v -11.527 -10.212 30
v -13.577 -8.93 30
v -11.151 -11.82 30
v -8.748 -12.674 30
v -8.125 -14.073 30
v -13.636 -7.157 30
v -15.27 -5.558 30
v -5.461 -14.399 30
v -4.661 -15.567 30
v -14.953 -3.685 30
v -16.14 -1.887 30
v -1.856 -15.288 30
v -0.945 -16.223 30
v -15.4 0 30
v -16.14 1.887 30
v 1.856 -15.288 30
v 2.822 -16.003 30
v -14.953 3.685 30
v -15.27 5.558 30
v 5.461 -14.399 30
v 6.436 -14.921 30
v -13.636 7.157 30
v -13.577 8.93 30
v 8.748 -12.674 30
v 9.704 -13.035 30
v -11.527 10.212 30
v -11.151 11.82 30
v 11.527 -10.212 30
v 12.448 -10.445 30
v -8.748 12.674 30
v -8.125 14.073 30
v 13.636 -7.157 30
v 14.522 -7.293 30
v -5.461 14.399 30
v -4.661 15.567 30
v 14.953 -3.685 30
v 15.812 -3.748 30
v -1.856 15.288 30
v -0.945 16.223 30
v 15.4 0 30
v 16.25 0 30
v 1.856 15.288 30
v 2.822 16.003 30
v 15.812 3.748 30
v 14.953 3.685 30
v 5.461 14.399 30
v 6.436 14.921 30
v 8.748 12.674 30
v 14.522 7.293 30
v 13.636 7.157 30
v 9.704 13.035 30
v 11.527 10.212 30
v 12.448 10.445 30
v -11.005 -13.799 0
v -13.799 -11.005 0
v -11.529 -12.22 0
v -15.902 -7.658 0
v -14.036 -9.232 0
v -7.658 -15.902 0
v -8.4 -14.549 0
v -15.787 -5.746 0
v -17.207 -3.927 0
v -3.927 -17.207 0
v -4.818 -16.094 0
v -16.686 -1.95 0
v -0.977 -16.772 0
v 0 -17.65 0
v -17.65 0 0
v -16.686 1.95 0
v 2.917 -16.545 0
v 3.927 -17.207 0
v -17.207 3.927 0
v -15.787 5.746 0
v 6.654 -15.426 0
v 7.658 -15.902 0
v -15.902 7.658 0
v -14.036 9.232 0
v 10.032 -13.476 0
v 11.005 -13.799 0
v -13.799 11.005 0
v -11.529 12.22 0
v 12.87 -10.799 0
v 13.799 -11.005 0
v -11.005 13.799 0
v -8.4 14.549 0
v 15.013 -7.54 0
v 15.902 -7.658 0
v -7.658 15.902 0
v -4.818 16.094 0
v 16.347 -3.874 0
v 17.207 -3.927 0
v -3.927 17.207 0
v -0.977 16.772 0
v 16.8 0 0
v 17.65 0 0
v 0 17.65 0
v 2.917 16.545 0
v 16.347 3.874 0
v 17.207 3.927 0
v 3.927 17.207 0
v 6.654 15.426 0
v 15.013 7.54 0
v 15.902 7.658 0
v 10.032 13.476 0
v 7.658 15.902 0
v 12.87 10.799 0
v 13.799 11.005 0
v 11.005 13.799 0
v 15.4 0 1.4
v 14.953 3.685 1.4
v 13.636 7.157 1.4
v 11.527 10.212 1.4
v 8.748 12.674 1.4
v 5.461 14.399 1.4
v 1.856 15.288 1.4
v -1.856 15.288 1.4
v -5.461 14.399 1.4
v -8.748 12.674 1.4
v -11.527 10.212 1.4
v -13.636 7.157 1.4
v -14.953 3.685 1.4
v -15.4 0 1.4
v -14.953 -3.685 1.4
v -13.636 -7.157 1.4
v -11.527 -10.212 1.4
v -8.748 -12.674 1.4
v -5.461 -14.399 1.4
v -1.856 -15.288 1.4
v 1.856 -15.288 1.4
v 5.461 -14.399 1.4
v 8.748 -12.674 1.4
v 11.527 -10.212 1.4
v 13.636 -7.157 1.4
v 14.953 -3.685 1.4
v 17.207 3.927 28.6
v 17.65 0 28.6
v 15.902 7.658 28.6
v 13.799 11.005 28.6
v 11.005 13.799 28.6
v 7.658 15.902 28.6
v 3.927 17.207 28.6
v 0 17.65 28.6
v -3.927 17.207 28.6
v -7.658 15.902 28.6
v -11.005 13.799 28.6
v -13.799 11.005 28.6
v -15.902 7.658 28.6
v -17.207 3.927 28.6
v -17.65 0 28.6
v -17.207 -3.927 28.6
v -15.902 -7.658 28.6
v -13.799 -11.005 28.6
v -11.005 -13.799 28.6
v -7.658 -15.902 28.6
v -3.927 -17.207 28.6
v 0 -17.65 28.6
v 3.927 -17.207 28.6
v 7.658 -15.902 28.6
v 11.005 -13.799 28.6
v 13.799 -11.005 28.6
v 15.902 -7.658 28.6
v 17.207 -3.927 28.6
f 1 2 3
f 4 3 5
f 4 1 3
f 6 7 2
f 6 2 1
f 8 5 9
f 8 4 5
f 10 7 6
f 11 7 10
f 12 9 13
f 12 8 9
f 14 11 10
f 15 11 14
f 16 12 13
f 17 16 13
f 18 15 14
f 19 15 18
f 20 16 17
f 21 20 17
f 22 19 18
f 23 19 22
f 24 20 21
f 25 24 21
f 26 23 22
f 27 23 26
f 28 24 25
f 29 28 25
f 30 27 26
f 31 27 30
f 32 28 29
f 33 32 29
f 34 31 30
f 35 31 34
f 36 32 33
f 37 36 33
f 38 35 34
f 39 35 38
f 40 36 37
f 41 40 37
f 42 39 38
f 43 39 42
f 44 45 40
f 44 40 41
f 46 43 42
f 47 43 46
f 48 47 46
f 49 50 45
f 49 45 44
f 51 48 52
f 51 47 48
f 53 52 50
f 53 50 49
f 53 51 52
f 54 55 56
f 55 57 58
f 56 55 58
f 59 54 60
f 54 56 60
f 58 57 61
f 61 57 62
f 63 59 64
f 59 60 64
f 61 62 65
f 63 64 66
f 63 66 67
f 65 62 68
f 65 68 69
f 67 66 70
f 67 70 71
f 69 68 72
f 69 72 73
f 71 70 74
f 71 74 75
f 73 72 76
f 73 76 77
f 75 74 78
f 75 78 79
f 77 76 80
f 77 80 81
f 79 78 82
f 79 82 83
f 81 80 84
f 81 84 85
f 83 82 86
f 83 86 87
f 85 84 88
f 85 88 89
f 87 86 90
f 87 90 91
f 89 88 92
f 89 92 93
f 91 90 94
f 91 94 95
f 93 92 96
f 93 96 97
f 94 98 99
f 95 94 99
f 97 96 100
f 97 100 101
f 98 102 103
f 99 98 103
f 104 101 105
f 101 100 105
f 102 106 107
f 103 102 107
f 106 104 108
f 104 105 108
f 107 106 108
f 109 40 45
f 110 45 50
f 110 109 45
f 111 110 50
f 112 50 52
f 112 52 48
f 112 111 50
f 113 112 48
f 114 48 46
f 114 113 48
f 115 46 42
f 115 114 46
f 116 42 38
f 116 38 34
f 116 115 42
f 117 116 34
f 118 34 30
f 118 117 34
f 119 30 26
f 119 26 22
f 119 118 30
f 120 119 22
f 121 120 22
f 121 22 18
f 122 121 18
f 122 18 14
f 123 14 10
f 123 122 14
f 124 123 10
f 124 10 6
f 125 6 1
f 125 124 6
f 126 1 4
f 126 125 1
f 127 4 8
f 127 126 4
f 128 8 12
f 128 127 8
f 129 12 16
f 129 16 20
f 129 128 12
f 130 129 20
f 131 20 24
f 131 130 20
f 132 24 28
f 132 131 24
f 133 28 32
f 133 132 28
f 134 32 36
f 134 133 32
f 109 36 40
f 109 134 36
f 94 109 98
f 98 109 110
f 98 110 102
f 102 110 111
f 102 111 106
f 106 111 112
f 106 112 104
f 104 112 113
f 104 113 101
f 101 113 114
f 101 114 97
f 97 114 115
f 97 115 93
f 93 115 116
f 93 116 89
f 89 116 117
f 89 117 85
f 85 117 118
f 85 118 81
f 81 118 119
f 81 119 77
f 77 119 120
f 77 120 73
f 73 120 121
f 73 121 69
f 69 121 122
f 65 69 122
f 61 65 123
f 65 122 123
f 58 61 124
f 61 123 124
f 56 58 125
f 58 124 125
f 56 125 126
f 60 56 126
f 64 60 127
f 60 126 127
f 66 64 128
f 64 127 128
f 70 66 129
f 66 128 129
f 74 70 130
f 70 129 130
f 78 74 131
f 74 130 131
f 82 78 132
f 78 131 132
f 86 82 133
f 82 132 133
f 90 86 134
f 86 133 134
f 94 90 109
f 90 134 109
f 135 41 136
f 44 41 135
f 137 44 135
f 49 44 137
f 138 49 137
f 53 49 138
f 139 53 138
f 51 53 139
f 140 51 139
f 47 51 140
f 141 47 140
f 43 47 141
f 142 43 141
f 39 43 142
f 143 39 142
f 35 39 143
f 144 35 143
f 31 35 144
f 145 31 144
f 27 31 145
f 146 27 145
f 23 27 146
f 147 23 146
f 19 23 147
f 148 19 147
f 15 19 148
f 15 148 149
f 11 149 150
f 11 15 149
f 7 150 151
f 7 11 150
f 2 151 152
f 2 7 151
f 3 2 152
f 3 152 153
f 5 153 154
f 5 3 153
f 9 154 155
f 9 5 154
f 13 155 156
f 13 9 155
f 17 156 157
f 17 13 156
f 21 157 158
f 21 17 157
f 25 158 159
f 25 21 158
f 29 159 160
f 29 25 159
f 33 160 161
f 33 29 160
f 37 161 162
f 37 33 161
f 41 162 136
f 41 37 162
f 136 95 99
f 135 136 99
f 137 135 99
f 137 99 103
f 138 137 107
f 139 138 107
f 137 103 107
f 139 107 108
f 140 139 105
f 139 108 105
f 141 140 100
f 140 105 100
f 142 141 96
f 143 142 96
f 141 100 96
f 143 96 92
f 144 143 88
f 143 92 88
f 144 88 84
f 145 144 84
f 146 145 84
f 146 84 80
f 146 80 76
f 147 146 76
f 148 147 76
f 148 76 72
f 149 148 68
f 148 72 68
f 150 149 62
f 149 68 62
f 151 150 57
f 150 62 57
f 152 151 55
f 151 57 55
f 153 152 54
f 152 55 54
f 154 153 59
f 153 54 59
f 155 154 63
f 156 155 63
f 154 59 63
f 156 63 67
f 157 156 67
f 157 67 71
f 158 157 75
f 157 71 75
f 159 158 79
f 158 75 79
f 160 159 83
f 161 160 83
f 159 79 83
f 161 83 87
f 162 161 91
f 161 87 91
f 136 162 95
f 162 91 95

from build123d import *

# Parameters (mm, degrees)
SKETCH_R        = 17.65
SKETCH_R_2      = 15.4
PAD_DEPTH       = 30
CHAMFER_SIZE    = 1.4
CHAMFER001_SIZE = 1.4


with BuildPart() as part:
    # Sketch → Pad (new body)
    with BuildSketch(Plane.XY):
        Circle(SKETCH_R)
        Circle(SKETCH_R_2, mode=Mode.SUBTRACT)
    extrude(amount=PAD_DEPTH)

    # Chamfer
    chamfer_edges = [part.edges().sort_by_distance(p)[0] for p in [
        (-17.65, 0, 30),
    ]]
    chamfer(chamfer_edges, length=CHAMFER_SIZE)

    # Chamfer001
    chamfer001_edges = [part.edges().sort_by_distance(p)[0] for p in [
        (-15.4, 0, 0),
    ]]
    chamfer(chamfer001_edges, length=CHAMFER001_SIZE)


solid = part.part
